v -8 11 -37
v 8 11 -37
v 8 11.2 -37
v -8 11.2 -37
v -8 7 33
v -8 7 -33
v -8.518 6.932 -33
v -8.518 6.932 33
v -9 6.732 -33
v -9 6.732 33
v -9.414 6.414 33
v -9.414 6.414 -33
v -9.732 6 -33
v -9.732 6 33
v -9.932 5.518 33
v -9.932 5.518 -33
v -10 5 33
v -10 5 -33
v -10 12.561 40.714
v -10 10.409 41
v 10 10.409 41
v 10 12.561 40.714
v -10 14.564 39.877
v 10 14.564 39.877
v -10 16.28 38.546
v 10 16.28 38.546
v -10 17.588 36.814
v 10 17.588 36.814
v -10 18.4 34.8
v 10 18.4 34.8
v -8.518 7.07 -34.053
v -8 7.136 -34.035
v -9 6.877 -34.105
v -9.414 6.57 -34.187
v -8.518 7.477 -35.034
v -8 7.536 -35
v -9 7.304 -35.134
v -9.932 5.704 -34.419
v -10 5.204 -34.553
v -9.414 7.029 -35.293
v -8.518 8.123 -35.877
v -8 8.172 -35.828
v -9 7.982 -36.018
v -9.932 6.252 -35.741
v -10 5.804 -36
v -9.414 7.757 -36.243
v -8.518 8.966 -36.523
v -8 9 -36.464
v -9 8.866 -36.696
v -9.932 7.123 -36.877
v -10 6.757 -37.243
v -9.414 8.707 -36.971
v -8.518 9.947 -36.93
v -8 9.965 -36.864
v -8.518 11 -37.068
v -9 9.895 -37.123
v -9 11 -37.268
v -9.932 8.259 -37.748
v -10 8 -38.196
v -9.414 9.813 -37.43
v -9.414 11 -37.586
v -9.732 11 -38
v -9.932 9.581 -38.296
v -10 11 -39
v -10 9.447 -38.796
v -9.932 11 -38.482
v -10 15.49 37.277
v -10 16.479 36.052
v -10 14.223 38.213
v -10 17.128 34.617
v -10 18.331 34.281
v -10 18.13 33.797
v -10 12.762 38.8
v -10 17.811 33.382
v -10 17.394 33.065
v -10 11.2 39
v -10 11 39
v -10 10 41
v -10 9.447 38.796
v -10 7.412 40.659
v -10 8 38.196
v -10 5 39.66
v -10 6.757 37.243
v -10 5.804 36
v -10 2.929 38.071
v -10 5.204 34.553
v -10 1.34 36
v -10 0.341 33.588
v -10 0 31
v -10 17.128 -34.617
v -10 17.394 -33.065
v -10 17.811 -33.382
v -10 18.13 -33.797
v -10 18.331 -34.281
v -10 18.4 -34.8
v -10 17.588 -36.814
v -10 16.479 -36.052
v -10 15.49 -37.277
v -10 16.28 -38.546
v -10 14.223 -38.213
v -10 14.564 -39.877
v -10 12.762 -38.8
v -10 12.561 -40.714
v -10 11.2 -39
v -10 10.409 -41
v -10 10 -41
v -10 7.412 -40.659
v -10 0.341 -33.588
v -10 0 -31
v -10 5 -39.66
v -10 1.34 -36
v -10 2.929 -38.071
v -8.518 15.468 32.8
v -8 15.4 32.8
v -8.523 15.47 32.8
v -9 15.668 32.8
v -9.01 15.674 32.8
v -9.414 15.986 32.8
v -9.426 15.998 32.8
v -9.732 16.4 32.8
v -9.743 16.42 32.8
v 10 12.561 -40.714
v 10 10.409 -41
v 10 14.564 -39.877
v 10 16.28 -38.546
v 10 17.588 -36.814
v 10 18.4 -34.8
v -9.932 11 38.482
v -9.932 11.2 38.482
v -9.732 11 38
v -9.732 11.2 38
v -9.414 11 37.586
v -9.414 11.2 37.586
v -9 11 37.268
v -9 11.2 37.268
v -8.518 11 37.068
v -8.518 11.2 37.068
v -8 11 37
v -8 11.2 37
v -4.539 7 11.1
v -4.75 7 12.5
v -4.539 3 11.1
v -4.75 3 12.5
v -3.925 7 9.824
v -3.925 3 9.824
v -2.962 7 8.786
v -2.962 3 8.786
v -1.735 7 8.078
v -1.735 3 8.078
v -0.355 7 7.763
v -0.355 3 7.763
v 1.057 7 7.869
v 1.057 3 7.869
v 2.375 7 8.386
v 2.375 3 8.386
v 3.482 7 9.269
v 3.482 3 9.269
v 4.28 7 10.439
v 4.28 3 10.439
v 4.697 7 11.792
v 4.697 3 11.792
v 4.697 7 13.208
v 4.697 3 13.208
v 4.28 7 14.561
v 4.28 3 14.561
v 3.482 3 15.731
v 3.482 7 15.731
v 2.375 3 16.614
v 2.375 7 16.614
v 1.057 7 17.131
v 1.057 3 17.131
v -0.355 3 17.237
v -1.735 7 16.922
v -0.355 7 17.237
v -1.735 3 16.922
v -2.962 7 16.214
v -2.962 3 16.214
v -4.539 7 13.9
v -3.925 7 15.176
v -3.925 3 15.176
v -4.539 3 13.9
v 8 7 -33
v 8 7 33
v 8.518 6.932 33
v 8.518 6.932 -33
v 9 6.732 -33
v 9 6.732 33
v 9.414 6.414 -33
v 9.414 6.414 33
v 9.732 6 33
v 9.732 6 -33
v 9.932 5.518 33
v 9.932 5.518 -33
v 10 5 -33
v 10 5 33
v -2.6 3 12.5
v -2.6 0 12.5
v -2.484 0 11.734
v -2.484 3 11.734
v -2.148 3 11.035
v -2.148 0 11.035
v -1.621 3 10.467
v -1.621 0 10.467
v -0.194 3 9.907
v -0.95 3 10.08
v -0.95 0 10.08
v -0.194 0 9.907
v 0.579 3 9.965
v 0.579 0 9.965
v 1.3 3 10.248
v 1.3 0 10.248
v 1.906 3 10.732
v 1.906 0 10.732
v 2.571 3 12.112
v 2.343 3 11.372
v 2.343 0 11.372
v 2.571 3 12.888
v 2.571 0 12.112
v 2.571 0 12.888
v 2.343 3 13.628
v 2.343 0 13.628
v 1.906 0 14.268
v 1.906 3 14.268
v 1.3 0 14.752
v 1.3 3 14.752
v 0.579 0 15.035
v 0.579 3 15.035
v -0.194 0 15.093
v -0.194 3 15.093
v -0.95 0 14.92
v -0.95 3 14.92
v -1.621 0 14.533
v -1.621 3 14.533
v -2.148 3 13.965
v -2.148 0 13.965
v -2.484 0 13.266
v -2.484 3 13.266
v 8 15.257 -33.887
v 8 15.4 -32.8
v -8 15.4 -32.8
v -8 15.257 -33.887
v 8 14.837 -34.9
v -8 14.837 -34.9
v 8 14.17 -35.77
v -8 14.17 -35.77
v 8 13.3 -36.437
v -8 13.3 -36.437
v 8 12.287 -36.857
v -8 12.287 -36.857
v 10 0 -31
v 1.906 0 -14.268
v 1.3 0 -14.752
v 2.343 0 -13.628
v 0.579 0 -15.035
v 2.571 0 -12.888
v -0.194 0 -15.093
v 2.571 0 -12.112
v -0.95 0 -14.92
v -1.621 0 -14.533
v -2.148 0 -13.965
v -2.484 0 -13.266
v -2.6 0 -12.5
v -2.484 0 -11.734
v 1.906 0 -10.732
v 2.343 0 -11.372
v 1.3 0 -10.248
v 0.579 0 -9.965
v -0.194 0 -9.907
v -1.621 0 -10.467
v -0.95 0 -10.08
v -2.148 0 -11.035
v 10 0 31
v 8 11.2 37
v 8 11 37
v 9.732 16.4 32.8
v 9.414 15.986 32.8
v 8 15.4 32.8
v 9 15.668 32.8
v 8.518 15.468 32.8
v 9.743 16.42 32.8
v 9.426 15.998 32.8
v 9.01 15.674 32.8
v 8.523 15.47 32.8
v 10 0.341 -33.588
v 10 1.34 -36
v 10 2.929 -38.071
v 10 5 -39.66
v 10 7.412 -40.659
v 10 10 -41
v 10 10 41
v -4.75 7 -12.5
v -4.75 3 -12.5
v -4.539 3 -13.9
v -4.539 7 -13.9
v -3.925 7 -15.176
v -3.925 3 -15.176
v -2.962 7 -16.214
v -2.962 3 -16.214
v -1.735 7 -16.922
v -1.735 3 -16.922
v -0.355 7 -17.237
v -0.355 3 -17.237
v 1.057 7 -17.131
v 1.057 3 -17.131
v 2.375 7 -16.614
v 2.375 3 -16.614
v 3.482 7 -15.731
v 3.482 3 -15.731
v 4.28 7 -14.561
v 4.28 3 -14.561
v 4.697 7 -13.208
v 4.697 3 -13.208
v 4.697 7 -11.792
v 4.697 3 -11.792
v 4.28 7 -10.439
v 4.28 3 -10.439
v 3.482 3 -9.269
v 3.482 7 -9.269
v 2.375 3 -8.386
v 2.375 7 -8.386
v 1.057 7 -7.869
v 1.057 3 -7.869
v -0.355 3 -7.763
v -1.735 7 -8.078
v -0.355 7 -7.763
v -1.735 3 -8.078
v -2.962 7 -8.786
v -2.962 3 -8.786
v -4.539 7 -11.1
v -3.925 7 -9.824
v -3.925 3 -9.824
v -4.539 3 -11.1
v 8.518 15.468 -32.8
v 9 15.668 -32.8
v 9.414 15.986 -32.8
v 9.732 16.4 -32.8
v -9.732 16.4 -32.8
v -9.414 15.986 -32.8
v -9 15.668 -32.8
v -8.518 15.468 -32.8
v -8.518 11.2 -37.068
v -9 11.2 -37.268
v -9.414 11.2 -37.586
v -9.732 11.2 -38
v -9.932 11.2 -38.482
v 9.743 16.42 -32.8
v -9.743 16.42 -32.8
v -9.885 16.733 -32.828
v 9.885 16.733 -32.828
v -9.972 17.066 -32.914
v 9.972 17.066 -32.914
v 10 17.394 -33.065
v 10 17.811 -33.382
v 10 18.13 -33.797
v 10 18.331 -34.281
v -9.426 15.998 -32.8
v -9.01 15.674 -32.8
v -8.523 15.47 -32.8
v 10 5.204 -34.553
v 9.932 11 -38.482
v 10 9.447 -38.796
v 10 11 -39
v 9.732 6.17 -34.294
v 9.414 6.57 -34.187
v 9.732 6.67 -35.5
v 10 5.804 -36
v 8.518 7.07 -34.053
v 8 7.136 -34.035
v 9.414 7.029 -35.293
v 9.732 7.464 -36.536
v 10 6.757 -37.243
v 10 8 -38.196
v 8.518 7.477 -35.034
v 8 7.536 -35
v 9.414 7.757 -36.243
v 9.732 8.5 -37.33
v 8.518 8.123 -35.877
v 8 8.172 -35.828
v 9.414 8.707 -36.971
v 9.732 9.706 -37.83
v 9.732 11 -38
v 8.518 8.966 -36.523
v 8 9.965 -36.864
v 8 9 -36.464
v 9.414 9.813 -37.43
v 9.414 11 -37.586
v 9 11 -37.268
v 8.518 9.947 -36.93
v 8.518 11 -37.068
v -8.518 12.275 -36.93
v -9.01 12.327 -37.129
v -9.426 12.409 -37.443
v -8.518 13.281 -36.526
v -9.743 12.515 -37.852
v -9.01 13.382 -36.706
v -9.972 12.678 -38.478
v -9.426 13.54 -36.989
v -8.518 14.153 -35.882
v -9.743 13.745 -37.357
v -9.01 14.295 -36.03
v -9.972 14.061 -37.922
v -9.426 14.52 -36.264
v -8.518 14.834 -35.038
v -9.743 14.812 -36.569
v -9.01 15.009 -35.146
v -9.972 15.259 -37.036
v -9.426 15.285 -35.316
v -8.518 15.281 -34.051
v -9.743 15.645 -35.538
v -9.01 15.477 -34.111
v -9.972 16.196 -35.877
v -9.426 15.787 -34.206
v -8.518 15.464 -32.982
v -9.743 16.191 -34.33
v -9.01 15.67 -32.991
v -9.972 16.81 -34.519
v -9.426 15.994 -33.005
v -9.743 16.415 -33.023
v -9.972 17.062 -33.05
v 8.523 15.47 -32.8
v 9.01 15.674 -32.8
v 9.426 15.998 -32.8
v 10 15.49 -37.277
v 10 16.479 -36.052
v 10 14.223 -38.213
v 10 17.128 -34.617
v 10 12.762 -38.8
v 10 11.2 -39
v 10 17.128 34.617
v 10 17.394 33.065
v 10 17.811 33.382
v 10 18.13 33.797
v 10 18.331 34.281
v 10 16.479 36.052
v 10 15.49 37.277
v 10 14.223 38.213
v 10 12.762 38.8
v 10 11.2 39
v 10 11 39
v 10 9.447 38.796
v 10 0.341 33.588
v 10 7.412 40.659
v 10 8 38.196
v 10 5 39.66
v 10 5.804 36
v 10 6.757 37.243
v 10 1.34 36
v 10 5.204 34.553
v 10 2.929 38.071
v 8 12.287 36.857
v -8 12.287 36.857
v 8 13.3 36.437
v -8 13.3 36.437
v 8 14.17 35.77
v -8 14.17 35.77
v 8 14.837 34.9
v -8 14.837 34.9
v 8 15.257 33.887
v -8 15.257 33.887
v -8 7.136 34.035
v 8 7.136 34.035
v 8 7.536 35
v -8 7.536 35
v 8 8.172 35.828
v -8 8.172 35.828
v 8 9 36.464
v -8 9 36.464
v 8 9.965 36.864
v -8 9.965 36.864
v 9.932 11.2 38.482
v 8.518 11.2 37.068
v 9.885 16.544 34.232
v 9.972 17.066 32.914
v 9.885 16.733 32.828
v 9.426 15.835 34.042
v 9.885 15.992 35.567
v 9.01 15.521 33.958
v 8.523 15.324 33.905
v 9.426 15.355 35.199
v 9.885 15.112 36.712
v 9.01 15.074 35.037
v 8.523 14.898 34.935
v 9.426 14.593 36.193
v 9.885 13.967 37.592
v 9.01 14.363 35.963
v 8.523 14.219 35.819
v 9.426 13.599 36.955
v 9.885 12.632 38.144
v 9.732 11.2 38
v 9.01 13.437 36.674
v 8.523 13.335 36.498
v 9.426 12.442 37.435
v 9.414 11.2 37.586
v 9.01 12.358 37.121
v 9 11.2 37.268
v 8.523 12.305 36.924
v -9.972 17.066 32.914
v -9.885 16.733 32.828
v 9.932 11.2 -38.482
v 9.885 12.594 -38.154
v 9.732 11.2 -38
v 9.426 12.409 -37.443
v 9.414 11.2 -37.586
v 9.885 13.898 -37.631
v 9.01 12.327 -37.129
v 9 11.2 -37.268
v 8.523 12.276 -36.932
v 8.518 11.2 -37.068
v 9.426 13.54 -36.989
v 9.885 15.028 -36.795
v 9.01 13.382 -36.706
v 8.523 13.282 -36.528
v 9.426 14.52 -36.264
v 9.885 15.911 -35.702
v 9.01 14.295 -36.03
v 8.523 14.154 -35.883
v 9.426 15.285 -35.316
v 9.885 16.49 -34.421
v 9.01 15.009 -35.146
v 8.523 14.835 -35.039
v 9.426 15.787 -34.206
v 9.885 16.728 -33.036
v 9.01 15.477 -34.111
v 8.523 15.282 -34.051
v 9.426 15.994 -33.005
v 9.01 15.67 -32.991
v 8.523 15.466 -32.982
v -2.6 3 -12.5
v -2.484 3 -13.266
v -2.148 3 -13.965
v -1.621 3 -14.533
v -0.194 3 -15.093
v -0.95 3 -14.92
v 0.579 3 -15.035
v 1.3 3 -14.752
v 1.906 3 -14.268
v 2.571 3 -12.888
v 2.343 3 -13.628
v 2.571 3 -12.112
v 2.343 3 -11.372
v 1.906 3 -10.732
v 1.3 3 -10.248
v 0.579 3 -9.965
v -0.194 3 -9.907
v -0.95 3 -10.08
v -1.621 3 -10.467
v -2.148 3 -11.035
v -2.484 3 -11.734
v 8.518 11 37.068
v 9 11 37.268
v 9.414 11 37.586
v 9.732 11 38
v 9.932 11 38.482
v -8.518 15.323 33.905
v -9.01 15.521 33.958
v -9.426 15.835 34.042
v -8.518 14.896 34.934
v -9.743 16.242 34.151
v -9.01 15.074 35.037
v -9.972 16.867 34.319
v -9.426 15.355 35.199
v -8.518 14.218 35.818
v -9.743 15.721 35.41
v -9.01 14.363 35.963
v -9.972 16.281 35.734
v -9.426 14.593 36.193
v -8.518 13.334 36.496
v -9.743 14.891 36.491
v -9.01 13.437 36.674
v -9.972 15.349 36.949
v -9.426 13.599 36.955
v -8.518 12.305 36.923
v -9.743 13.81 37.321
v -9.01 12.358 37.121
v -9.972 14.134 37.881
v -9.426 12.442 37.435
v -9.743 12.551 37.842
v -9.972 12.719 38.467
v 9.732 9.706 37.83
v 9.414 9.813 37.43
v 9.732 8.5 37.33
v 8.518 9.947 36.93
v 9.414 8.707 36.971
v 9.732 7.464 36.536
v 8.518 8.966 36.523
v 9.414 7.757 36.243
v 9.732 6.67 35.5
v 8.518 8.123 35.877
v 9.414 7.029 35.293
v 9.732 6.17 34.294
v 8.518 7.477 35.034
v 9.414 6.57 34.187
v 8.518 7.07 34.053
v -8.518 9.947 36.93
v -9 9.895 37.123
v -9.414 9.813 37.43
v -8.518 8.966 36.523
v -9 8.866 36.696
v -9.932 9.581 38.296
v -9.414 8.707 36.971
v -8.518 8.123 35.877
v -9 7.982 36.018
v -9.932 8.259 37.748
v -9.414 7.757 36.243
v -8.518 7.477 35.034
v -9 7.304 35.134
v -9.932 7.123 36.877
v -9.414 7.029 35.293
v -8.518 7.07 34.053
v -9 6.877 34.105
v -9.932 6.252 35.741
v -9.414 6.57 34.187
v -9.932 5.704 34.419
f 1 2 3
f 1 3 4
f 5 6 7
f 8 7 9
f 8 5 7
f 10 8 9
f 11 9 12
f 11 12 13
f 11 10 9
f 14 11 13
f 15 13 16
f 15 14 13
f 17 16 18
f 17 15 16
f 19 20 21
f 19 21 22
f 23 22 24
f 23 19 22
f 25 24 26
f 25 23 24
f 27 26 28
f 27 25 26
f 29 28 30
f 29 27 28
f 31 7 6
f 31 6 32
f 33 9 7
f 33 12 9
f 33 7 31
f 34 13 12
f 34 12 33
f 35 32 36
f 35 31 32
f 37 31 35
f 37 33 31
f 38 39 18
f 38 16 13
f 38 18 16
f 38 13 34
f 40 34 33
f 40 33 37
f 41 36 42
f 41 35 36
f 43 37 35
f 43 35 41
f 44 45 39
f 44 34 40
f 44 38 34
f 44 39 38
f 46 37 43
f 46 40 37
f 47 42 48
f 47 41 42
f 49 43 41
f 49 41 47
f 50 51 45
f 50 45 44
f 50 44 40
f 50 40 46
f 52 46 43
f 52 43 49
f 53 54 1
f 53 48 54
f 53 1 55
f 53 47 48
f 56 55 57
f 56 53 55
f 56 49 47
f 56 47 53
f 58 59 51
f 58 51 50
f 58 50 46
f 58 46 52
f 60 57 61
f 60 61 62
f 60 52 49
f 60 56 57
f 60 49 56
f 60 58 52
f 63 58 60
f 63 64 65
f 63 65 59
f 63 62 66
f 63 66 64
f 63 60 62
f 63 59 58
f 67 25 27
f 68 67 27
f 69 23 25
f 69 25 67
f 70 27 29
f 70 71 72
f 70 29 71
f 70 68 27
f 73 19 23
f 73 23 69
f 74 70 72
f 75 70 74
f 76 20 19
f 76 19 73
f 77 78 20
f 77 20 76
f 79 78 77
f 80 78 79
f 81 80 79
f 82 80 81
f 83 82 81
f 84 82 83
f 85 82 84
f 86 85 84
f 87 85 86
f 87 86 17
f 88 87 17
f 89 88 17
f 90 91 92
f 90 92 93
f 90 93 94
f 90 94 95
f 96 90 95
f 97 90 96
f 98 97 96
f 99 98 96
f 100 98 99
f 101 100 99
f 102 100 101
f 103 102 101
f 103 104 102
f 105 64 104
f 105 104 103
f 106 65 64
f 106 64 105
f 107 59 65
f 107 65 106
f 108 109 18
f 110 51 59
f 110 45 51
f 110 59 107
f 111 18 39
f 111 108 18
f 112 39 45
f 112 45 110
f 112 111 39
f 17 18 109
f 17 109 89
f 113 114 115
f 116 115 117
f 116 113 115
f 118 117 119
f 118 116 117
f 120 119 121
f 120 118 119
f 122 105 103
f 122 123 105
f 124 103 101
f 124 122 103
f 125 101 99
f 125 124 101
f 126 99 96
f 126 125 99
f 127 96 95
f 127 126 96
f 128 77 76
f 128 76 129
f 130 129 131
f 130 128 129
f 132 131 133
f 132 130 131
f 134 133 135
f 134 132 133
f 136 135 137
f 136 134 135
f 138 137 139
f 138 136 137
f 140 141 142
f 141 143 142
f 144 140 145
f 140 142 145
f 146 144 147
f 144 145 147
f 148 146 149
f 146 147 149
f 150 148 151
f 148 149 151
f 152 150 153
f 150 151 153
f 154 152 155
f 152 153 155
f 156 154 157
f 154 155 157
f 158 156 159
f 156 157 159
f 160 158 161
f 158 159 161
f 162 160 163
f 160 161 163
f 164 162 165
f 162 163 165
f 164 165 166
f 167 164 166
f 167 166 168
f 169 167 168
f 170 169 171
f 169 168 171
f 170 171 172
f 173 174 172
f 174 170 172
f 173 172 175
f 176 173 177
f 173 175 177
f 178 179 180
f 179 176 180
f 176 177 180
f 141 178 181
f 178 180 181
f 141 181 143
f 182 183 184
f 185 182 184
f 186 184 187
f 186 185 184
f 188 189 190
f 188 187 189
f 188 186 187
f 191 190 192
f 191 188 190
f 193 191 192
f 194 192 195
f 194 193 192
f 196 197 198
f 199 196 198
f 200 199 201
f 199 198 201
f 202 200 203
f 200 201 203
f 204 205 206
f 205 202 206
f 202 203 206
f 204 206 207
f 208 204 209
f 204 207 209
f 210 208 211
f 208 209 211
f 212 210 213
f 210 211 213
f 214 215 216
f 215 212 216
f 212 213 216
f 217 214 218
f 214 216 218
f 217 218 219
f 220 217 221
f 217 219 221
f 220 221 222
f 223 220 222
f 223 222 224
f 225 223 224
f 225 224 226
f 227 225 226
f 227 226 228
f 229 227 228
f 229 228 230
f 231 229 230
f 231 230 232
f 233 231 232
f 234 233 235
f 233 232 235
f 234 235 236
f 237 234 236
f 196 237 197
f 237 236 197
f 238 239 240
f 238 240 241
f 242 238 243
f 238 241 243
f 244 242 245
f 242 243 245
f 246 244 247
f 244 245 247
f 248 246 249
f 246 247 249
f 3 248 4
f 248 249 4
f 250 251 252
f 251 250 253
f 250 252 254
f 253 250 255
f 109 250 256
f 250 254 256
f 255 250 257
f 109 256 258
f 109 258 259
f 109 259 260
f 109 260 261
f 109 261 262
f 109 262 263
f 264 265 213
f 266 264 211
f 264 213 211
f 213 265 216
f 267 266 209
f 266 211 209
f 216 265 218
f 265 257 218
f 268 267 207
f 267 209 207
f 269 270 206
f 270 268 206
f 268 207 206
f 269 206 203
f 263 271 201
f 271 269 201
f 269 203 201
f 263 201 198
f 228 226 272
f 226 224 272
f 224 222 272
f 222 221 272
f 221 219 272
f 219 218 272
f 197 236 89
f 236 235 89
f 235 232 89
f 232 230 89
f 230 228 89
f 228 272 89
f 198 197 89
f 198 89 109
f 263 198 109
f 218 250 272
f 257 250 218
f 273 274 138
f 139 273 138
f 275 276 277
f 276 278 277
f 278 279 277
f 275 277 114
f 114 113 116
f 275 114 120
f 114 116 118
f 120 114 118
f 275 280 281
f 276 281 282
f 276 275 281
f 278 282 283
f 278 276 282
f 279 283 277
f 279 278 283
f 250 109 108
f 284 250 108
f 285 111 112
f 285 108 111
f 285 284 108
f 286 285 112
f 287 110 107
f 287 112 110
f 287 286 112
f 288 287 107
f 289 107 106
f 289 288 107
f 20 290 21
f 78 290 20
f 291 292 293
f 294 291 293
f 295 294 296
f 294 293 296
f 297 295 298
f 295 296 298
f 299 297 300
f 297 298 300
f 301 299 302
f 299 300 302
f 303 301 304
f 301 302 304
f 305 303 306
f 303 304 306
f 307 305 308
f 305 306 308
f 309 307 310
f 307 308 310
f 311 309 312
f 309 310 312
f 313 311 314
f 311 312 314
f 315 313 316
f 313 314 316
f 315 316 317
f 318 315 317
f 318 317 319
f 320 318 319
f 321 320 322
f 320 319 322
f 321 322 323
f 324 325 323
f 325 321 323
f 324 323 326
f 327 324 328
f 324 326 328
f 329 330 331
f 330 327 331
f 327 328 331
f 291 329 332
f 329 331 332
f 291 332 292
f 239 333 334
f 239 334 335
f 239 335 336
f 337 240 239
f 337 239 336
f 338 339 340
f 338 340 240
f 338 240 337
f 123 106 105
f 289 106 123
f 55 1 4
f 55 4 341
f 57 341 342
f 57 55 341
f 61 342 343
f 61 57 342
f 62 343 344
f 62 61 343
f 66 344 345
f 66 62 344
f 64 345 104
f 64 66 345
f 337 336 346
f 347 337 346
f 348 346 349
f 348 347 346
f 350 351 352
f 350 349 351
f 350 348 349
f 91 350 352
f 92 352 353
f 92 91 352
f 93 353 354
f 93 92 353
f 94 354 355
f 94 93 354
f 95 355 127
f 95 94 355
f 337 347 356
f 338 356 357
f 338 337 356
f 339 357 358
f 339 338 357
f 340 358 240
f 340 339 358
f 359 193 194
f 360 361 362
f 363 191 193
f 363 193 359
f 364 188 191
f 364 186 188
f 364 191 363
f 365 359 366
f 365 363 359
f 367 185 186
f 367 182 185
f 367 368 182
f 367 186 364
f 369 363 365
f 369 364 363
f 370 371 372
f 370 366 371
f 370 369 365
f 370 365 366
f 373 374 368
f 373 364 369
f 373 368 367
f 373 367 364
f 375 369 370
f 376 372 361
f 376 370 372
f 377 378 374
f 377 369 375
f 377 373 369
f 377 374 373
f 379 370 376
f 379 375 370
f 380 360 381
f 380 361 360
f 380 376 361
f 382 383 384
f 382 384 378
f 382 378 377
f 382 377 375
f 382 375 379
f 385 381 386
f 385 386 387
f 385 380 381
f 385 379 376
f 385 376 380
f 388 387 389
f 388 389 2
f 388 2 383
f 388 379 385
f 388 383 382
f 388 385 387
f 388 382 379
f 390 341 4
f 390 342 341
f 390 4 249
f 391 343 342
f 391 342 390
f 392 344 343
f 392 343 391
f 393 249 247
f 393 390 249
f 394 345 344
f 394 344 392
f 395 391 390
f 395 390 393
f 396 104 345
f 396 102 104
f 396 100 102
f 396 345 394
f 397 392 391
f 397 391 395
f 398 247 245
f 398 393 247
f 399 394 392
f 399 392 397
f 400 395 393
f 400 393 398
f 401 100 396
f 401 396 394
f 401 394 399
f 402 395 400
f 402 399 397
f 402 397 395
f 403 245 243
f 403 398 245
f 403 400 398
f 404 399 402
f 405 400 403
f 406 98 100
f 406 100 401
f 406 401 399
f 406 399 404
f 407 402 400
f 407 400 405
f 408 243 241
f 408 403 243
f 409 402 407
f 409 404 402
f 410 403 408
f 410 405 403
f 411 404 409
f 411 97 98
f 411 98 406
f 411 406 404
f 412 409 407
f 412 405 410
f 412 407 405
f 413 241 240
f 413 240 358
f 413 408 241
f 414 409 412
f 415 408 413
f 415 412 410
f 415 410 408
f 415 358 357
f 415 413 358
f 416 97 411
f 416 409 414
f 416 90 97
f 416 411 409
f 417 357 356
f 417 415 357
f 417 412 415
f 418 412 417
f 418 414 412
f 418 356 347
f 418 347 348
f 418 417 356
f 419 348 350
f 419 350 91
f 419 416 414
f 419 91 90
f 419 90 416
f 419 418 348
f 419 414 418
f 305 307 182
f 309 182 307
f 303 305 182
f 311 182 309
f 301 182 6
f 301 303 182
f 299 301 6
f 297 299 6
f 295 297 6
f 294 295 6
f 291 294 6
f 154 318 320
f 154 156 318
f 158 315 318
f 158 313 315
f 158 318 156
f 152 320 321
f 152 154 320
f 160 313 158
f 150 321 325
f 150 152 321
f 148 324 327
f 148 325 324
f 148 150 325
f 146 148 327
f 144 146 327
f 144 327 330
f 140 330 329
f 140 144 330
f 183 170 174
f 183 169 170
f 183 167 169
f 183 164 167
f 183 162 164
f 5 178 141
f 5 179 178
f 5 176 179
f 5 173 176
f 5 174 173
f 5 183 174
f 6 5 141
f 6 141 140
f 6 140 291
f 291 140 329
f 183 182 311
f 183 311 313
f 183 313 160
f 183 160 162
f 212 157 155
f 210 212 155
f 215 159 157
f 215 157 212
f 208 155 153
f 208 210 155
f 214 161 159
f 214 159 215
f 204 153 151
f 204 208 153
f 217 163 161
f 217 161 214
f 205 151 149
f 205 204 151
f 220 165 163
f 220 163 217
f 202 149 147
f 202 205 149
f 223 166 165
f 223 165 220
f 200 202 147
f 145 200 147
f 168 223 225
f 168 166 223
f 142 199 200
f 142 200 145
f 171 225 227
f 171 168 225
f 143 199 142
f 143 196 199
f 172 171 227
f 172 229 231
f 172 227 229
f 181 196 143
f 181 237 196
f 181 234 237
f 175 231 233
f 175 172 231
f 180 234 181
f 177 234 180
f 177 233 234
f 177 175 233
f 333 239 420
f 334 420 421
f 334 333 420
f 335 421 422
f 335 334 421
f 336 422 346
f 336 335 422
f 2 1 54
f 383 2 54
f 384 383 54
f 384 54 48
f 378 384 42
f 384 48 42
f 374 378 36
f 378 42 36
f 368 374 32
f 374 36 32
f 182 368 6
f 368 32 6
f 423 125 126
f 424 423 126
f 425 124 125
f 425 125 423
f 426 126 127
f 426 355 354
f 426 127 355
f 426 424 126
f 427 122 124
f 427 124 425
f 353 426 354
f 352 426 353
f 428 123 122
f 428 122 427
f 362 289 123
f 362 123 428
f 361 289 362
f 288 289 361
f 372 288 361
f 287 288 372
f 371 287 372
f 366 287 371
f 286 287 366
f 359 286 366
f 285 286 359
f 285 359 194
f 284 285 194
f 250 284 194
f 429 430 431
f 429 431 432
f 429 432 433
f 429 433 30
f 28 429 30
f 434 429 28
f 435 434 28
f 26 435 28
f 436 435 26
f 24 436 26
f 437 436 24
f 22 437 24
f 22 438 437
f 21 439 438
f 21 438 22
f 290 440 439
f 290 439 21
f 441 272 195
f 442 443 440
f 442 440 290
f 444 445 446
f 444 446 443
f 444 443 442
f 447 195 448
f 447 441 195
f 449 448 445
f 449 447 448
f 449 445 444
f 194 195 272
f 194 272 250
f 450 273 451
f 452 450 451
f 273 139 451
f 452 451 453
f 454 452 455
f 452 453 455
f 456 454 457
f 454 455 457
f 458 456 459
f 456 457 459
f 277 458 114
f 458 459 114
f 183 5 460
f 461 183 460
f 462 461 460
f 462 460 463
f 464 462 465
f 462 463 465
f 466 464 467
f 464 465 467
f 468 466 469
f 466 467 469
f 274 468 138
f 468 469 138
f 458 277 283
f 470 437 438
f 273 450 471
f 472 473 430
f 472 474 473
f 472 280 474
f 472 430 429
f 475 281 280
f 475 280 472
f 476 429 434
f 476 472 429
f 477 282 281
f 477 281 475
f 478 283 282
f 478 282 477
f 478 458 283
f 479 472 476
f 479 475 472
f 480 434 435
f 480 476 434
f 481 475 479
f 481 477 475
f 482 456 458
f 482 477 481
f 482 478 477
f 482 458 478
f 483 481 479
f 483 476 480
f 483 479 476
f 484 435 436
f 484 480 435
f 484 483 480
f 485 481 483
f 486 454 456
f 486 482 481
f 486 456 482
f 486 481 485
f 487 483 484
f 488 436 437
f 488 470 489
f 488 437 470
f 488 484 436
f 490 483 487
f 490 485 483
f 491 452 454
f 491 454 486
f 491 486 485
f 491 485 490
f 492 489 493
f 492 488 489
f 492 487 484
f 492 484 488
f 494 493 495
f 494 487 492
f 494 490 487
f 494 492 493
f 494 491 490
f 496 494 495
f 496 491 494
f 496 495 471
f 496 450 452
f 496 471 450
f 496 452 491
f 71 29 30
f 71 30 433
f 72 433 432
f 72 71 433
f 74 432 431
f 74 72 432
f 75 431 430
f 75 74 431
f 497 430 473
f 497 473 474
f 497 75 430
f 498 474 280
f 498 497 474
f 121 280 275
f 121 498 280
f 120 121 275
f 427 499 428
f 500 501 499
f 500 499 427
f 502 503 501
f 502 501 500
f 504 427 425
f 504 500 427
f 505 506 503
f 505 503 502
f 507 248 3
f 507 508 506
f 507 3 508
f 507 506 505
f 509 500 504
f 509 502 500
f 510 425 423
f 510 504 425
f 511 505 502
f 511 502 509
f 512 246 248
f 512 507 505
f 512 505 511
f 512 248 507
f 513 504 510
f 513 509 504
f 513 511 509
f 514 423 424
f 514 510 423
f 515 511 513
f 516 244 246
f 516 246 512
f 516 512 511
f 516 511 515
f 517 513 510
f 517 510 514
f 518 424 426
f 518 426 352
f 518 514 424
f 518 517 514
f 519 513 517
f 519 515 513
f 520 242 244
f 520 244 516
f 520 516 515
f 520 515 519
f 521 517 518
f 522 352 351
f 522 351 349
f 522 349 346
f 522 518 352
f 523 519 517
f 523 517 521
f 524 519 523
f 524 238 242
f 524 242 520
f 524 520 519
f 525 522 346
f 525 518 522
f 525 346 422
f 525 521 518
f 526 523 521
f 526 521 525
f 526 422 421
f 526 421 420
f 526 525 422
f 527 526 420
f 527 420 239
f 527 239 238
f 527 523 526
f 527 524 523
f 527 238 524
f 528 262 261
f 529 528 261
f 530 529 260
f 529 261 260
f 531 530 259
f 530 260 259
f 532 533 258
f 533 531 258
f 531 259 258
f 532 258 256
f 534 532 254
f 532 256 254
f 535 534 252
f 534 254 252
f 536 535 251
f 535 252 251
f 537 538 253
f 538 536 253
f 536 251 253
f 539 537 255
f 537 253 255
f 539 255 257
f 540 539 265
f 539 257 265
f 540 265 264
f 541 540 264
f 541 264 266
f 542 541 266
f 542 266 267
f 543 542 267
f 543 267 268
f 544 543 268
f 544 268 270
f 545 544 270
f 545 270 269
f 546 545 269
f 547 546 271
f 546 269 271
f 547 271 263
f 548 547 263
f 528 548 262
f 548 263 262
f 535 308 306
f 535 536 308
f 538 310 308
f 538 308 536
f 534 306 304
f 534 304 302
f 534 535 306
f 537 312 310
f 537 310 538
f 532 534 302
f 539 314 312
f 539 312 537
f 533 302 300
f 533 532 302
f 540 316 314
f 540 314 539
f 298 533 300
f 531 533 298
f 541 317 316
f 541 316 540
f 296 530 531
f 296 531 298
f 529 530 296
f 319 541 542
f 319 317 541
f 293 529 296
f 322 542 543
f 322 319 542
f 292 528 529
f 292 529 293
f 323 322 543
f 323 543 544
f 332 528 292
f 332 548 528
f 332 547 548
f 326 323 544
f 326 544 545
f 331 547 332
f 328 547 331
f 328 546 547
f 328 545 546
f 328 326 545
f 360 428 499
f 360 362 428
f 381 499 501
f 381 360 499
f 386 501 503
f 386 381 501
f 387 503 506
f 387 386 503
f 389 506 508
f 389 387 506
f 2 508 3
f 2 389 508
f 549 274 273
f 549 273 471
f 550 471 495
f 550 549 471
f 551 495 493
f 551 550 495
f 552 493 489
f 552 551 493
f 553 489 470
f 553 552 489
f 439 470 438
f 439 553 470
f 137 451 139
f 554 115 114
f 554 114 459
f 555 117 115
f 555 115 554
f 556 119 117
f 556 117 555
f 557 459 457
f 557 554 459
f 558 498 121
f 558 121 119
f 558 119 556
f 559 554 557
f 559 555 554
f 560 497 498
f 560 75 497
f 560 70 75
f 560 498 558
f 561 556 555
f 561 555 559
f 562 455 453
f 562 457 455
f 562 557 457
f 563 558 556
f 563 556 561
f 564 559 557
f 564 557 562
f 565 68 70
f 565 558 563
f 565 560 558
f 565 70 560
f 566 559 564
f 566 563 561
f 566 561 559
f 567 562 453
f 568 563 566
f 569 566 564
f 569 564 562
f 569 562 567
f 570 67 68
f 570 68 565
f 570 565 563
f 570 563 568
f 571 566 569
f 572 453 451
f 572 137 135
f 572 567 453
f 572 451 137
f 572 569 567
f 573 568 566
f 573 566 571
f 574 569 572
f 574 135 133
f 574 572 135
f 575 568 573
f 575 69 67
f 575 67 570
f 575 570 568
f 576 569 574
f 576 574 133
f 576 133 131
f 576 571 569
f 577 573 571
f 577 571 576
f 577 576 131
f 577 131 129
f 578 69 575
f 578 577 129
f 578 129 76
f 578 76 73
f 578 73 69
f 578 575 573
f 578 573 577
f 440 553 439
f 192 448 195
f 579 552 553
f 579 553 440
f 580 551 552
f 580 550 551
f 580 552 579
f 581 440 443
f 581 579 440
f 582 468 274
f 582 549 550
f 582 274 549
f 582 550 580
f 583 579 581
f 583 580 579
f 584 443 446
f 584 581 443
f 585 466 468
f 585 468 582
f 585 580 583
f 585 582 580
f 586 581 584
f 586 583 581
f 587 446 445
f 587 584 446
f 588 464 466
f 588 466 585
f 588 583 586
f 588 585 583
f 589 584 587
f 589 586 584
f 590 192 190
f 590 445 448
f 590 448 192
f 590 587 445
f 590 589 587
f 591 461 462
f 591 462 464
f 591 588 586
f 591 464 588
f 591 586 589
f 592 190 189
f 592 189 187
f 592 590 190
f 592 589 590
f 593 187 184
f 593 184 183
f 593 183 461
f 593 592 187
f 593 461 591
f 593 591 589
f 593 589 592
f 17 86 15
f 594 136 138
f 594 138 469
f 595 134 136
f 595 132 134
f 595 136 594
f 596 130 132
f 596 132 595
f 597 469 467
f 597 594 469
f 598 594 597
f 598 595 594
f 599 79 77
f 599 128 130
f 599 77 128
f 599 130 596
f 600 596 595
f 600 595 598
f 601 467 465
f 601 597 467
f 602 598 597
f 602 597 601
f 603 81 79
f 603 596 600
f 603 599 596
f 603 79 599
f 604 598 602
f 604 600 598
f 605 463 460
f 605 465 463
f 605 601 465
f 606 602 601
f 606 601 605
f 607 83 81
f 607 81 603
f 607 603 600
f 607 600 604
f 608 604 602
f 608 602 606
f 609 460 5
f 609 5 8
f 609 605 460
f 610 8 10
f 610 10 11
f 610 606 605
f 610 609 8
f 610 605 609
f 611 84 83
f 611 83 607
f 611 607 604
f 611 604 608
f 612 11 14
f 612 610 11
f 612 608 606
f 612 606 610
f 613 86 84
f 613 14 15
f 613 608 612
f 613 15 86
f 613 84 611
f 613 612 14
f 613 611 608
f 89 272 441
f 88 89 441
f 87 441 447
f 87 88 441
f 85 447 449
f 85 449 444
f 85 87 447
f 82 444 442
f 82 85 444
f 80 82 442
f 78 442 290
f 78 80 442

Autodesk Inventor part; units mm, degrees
ref_plane "YZ Plane" through (0, 0, 0) normal (1, 0, 0) x (0, 1, 0)
ref_plane "XZ Plane" through (0, 0, 0) normal (0, 1, 0) x (-1, 0, 0)
ref_plane "XY Plane" through (0, 0, 0) normal (0, 0, 1) x (1, 0, 0)
sketch "Sketch1" plane through (0, 0, 0) normal (0, 1, 0) x (-1, 0, 0)
  circle A0 centre (0, 12.5) radius 2.6
  circle A1 centre (0, -12.5) radius 2.6
  circle A2 centre (0, 12.5) radius 4.75
  circle A3 centre (0, -12.5) radius 4.75
  circle A4 centre (0, 12.5) radius 7.5
  circle A5 centre (0, -12.5) radius 7.5
  line L0 (7.5, 12.5) -> (7.5, -12.5)
  line L1 (-7.5, -12.5) -> (-7.5, 12.5)
  line L2 (0, 12.5) -> (0, -12.5) construction
  line L3 (7.5, -12.5) -> (7.5, 12.5)
  line L4 (-10, 41) -> (10, 41)
  line L5 (10, 41) -> (10, -41)
  line L6 (10, -41) -> (-10, -41)
  line L7 (-10, -41) -> (-10, 41)
  point P0 (0, 0)
  dimension "d0" = 5.2
  dimension "d1" = 5.2
  dimension "d2" = 25
  dimension "d3" = 12.5
  dimension "d6" = 9.5
  dimension "d7" = 9.5
  dimension "d8" = 15
  dimension "d9" = 15
  dimension "d19" = 20
  dimension "d20" = 82
  dimension "d21" = 41
  dimension "d38" = 10
extrude "Extrusion1" add sketch "Sketch1" along normal blind 3 contours A2 | A3
extrude "Extrusion2" add sketch "Sketch1" along normal blind 7 contours A4 | L0 A5 L1 A4 | A5 | L4 L5 L6 L7
sketch "Sketch2" plane through (0, 7, 0) normal (0, 1, 0) x (1, 0, 0)
  circle A0 centre (0, 12.5) radius 4.75 projected
  circle A1 centre (0, -12.5) radius 4.75 projected
  line L0 (-10, -41) -> (10, -41) projected
  line L1 (10, -41) -> (10, 41) projected
  line L2 (10, 41) -> (-10, 41) projected
  line L3 (-10, 41) -> (-10, -41) projected
  line L4 (10, 41) -> (10, -41) projected
  line L5 (10, -37) -> (-10, -37)
  line L6 (10, 37) -> (-10, 37)
  point P0 (0, 0)
  dimension "d24" = 4
  dimension "d25" = 4
extrude "Extrusion3" add sketch "Sketch2" along normal blind 8.4 contours L3 L5 L1 L0 | L3 L2 L1 L6
sketch "Sketch3" plane through (0, 15.4, 0) normal (0, 1, 0) x (1, 0, 0)
  line L0 (10, 41) -> (-10, 41) projected
  line L1 (-10, 41) -> (-10, 37) projected
  line L2 (-10, -41) -> (10, -41) projected
  line L3 (10, 37) -> (10, 41) projected
  line L4 (-10, 37) -> (10, 37) projected
  line L5 (10, -41) -> (10, -37) projected
  line L6 (10, -37) -> (-10, -37) projected
  line L7 (-10, -37) -> (-10, -41) projected
  line L8 (-10, -41) -> (10, -41)
  line L9 (10, -41) -> (10, -32.8)
  line L10 (10, -32.8) -> (-10, -32.8)
  line L11 (-10, -32.8) -> (-10, -41)
  line L12 (10, -37) -> (10, 37) projected
  line L13 (-10, 41) -> (10, 41)
  line L14 (10, 41) -> (10, 32.8)
  line L15 (10, 32.8) -> (-10, 32.8)
  line L16 (-10, 32.8) -> (-10, 41)
  dimension "d39" = 4.2
  dimension "d40" = 4.2
extrude "Extrusion4" add sketch "Sketch3" along normal blind 3
fillet "Fillet4" radius 4 2 edges at (0, 7, 37) (0, 7, -37)
fillet "Fillet5" radius 4.2 2 edges at (0, 15.4, -37) (0, 15.4, 37)
fillet "Fillet6" radius 2 2 edges at (0, 18.4, 32.8) (0, 18.4, -32.8)
fillet "Fillet7" radius 10 2 edges at (0, 0, 41) (0, 0, -41)
fillet "Fillet8" radius 8.25 2 edges at (0, 18.4, 41) (0, 18.4, -41)
fillet "Fillet9" radius 2 14 edges at (10, 8.1716, -35.8284) (10, 11.1, -37) (10, 14.1699, -35.7699) (10, 8.1716, 35.8284) (10, 11.1, 37) (10, 14.1699, 35.7699) (10, 7, 0) (-10, 8.1716, 35.8284) (-10, 11.1, 37) (-10, 14.1699, 35.7699) (-10, 8.1716, -35.8284) (-10, 11.1, -37) (-10, 14.1699, -35.7699) (-10, 7, 0)
equation "\"d3\" = 0.5 * d2"
equation "\"d21\" = 0.5 * d20"
equation "\"d38\" = 0.5 * d19"
properties part number "HolderMid"
